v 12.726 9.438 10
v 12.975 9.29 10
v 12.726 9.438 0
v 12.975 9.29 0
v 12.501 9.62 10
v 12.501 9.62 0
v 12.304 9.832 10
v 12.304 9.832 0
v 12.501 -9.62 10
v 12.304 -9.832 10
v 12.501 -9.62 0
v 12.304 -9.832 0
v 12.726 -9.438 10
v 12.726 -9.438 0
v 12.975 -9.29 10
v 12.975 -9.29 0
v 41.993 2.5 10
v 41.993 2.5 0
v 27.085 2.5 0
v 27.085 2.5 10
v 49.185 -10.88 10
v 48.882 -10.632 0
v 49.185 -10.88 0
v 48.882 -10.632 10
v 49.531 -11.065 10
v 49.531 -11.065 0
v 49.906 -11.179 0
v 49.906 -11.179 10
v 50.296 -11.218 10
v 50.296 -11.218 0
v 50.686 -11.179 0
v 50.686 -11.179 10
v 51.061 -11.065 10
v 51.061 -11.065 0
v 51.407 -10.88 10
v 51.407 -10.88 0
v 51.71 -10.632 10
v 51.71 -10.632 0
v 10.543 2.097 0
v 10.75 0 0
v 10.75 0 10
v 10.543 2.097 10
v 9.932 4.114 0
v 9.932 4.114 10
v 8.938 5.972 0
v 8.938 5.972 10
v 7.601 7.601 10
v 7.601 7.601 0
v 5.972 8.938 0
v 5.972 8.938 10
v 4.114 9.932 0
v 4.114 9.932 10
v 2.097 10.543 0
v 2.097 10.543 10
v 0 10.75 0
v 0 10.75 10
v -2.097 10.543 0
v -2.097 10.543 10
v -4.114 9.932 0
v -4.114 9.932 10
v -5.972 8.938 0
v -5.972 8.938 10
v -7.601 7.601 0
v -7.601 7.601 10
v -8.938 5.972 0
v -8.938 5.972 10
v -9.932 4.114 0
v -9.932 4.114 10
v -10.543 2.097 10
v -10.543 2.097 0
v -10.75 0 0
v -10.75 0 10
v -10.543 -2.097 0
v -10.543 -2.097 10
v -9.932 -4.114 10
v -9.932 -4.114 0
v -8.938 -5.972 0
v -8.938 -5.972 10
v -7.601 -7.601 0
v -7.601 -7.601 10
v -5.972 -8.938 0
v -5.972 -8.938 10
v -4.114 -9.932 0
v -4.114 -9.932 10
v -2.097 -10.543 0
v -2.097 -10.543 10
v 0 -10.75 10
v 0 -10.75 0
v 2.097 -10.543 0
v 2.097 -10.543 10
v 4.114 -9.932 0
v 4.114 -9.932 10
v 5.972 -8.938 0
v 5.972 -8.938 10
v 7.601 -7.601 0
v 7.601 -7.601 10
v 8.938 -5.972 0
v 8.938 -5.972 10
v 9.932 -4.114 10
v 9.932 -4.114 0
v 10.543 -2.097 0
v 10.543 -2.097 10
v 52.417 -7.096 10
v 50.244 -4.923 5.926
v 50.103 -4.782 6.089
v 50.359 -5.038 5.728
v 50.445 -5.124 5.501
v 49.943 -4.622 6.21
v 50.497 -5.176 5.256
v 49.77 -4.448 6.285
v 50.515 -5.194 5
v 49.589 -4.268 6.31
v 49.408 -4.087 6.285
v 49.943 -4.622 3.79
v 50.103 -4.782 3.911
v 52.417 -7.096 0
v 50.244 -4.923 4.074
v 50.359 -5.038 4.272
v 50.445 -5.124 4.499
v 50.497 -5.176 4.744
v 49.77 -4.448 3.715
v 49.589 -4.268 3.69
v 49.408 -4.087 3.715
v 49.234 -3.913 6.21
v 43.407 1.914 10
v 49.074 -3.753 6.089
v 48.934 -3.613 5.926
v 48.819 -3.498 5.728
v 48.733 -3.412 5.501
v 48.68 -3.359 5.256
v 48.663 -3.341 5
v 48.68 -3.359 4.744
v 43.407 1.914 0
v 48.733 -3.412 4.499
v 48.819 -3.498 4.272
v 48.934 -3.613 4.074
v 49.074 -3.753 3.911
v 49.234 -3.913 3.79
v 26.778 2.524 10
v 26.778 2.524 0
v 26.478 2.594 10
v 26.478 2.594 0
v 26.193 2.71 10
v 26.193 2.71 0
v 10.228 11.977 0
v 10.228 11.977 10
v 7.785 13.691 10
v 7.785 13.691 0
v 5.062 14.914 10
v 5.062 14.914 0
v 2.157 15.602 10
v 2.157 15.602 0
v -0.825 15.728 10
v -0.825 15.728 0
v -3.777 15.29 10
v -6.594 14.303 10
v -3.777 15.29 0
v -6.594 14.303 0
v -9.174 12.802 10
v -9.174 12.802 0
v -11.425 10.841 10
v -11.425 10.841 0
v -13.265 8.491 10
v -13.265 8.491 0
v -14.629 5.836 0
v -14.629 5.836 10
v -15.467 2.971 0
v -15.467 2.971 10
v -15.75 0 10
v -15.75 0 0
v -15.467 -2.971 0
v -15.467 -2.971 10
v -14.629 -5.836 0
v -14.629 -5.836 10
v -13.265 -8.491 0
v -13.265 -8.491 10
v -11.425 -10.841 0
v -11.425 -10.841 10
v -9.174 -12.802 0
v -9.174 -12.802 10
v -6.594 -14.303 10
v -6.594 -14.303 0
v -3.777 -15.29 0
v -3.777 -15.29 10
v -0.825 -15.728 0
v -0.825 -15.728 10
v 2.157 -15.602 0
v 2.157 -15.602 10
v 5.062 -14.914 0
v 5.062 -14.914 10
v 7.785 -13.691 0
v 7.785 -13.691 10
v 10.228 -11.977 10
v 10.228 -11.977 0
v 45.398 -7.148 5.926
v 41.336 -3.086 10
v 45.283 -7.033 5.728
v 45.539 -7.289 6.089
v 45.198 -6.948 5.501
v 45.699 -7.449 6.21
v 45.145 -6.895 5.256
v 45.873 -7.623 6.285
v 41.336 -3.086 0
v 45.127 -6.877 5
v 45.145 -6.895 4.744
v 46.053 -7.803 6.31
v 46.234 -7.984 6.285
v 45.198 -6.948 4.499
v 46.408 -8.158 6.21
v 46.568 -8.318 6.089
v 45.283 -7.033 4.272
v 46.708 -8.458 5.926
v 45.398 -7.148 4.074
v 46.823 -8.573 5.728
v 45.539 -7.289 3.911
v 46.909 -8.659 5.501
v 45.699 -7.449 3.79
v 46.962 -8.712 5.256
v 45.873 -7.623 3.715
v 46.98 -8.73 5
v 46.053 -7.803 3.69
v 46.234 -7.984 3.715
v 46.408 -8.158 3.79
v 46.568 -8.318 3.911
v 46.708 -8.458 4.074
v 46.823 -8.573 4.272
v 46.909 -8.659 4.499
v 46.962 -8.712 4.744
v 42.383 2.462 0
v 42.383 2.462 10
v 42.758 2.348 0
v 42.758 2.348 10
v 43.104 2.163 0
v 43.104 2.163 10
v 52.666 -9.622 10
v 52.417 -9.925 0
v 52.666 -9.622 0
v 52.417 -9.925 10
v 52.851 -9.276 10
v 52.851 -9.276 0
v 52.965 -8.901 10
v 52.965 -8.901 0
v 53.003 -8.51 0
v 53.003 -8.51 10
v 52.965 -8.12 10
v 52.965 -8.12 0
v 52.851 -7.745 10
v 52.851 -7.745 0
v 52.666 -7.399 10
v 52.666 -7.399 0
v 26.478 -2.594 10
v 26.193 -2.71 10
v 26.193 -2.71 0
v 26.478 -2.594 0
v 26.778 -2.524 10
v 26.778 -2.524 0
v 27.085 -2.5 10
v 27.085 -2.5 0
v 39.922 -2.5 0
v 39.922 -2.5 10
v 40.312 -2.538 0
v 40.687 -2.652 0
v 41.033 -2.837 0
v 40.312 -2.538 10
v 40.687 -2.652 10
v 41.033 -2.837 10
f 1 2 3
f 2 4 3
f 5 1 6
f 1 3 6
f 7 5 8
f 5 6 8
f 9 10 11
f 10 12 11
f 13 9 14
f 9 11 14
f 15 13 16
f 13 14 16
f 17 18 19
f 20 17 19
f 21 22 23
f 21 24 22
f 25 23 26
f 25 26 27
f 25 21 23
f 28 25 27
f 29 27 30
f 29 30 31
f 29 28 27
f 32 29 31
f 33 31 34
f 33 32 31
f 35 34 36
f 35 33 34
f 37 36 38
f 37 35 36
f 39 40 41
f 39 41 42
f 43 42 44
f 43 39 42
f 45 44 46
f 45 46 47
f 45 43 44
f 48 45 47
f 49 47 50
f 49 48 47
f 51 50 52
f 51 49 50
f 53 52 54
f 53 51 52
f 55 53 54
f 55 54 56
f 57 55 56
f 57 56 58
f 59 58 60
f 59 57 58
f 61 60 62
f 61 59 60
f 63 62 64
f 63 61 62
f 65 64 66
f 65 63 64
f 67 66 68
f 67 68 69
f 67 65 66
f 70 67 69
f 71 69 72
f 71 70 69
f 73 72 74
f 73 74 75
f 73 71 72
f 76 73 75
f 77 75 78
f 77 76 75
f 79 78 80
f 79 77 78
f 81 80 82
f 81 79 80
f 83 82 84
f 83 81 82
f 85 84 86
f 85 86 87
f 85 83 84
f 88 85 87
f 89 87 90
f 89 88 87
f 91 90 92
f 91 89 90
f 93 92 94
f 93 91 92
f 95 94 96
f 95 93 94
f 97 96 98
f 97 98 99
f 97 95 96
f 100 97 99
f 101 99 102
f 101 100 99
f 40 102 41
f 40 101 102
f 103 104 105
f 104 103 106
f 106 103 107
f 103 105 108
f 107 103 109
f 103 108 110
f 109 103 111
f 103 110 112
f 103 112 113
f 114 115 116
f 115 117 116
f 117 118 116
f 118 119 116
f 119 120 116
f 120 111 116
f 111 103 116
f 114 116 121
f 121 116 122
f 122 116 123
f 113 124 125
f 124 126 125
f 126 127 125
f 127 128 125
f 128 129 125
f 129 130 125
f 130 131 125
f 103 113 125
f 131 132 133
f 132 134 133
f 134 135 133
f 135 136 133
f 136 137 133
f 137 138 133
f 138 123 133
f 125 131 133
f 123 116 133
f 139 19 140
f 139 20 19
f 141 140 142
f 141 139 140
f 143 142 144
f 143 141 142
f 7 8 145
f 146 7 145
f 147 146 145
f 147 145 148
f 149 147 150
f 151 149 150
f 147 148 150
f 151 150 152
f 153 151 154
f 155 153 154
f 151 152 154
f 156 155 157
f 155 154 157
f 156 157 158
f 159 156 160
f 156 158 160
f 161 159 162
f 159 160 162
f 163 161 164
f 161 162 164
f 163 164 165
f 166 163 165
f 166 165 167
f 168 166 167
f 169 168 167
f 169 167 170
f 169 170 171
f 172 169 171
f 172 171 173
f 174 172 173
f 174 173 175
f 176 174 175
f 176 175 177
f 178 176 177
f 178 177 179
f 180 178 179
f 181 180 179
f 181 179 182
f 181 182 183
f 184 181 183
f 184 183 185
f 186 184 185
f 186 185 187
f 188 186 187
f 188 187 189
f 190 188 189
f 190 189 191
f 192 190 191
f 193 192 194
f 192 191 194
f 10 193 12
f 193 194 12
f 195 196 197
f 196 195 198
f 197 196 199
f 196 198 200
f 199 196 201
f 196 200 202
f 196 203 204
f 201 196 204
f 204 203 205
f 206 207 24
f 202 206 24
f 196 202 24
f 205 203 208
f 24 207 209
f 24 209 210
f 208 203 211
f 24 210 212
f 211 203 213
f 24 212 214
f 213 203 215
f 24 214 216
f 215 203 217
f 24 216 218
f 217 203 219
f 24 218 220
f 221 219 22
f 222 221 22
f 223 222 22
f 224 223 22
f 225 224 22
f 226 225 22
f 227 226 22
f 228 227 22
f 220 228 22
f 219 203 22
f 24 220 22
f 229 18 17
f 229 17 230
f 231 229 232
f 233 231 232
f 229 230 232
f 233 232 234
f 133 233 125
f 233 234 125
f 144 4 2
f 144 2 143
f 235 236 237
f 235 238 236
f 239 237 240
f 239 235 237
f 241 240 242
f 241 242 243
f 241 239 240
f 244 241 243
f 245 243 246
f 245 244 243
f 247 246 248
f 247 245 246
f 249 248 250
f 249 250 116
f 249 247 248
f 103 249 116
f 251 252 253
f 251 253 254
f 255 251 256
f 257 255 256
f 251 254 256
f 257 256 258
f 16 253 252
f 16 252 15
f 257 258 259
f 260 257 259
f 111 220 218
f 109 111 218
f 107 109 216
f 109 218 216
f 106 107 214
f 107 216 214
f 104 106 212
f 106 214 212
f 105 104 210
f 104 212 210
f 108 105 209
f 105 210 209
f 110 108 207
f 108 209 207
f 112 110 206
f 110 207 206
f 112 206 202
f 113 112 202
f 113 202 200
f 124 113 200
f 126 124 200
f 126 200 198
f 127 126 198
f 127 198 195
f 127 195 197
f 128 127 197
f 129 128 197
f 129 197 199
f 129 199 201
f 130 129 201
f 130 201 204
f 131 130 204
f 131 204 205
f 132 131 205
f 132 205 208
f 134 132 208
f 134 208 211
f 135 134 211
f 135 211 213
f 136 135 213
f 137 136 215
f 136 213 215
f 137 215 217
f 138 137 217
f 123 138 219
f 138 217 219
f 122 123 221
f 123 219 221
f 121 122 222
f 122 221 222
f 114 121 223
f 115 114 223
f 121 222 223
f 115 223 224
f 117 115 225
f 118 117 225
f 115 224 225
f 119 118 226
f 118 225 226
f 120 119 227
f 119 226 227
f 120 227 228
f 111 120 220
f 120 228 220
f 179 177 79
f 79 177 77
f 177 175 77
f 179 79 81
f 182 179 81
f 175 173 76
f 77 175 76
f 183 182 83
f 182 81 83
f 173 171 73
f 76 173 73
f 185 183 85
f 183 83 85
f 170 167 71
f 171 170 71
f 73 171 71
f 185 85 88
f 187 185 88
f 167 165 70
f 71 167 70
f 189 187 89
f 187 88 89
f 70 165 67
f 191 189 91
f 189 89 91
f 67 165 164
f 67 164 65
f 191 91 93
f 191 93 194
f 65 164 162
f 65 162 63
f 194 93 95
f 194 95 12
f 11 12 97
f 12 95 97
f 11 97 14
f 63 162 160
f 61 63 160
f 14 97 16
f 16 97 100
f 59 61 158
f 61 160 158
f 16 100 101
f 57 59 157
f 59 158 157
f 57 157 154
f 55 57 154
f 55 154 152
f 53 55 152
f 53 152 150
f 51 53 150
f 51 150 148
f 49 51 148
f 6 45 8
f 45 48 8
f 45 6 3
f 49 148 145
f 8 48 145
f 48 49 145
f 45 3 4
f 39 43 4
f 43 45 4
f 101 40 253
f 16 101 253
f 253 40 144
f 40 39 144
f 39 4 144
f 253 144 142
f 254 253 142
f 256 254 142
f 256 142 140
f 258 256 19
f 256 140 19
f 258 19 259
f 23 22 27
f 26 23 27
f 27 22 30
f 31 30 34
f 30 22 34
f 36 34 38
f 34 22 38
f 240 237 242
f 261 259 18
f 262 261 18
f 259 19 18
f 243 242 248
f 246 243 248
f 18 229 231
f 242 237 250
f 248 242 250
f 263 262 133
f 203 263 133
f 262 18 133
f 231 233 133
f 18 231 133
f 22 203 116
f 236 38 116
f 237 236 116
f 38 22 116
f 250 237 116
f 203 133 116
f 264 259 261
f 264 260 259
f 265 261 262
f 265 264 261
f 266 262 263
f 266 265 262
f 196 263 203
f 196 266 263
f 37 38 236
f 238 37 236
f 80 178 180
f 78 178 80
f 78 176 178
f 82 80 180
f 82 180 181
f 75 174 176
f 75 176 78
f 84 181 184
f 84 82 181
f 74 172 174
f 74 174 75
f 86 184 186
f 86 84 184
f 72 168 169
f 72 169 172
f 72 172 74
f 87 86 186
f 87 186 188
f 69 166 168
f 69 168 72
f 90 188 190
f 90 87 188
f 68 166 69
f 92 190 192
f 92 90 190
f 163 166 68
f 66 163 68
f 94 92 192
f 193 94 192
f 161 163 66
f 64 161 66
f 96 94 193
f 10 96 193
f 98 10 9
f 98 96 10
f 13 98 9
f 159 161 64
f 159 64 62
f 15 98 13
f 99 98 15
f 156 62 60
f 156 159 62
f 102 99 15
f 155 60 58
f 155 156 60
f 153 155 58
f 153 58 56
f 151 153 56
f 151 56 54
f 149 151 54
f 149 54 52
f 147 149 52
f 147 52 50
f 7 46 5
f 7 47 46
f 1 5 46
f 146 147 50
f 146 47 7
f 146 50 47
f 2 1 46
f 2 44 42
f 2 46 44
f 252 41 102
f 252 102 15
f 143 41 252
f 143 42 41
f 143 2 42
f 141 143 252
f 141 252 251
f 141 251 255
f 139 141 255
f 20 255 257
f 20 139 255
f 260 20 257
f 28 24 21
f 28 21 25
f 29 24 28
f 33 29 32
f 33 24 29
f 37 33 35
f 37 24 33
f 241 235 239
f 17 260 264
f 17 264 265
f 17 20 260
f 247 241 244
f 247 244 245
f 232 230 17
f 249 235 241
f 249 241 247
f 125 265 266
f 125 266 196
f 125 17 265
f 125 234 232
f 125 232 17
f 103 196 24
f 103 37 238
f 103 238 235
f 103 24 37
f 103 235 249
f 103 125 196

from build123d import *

# Parameters (mm, degrees)
F0_R        = 10.75
F1_DEPTH    = 10
F2_T1_DEPTH = 10
F3_R        = 1.31
F4_DEPTH    = 25
F5_R        = 2


# Not quite as in the source:
# - a fillet or chamfer that OpenCascade refuses, or shapes differently, is made with other operations: its cross-section is extruded or revolved along the edge and cut away or added


with BuildPart() as f1:
    # F0 (on Top) → F1 (new body)
    with BuildSketch(Plane.XY):
        with BuildLine():
            Line((40.75, 2.5), (15.5503215401, 2.5))
            ThreePointArc((15.5503215401, 2.5), (-15.75, 0), (15.5503215401, -2.5))
            Line((15.5503215401, -2.5), (40.75, -2.5))
            Line((40.75, -2.5), (50.295941546, -12.045941546))
            Line((50.295941546, -12.045941546), (53.831475452, -8.5104076401))
            Line((53.831475452, -8.5104076401), (42.8210678119, 2.5))
            Line((42.8210678119, 2.5), (40.75, 2.5))
        make_face()
        Circle(F0_R, mode=Mode.SUBTRACT)
    extrude(amount=F1_DEPTH)

    # F2: chamfer of 15 on 2 edges, made by hand

    # F2_s2 → F2_t1 (join)
    with BuildSketch(Plane.XY):
        with BuildLine():
            Line((27.1514391605, -2.2325951169), (12.0303066019, -9.7606848759))
            Line((12.0303066019, -9.7606848759), (11.7909271055, -9.579860495))
            ThreePointArc((11.7909271055, -9.579860495), (14.1178891417, -6.2759625701), (15.2541249393, -2.4523809524))
            Line((15.2541249393, -2.4523809524), (15.5503215401, -2.2))
            ThreePointArc((15.5503215401, -2.2), (21.3508803503, -2.2), (27.1514391605, -1.9325951169))
            Line((27.1514391605, -1.9325951169), (27.1514391605, -2.2325951169))
        make_face()
        with BuildLine():
            Line((12.0303066019, 9.7606848759), (27.1514391605, 2.2325951169))
            Line((27.1514391605, 2.2325951169), (27.1514391605, 1.9325951169))
            ThreePointArc((27.1514391605, 1.9325951169), (21.3508803503, 2.2), (15.5503215401, 2.2))
            Line((15.5503215401, 2.2), (15.2541249393, 2.4523809524))
            ThreePointArc((15.2541249393, 2.4523809524), (14.1178891417, 6.2759625701), (11.7909271055, 9.579860495))
            Line((11.7909271055, 9.579860495), (12.0303066019, 9.7606848759))
        make_face()
    extrude(amount=F2_T1_DEPTH)

    # F3 (on face) → F4 (cut)
    with BuildSketch(Plane(origin=(19.125, 19.125, 0), x_dir=(0.7071067812, -0.7071067812, 0), z_dir=(-0.7071067812, -0.7071067812, 0))):
        with Locations((38.0823682863, 5)):
            Circle(F3_R)
    extrude(amount=-F4_DEPTH, mode=Mode.SUBTRACT)

    # F5
    f5_edges = [f1.edges().sort_by_distance(p)[0] for p in [
        (50.295942, -12.045942, 5),
        (53.831475, -8.510408, 5),
        (40.75, -2.5, 5),
        (26.614322, -2.5, 5),
        (12.567424, -9.49328, 5),
        (42.821068, 2.5, 5),
        (26.614322, 2.5, 5),
        (12.567424, 9.49328, 5),
    ]]
    fillet(f5_edges, radius=F5_R)


solid = f1.part
